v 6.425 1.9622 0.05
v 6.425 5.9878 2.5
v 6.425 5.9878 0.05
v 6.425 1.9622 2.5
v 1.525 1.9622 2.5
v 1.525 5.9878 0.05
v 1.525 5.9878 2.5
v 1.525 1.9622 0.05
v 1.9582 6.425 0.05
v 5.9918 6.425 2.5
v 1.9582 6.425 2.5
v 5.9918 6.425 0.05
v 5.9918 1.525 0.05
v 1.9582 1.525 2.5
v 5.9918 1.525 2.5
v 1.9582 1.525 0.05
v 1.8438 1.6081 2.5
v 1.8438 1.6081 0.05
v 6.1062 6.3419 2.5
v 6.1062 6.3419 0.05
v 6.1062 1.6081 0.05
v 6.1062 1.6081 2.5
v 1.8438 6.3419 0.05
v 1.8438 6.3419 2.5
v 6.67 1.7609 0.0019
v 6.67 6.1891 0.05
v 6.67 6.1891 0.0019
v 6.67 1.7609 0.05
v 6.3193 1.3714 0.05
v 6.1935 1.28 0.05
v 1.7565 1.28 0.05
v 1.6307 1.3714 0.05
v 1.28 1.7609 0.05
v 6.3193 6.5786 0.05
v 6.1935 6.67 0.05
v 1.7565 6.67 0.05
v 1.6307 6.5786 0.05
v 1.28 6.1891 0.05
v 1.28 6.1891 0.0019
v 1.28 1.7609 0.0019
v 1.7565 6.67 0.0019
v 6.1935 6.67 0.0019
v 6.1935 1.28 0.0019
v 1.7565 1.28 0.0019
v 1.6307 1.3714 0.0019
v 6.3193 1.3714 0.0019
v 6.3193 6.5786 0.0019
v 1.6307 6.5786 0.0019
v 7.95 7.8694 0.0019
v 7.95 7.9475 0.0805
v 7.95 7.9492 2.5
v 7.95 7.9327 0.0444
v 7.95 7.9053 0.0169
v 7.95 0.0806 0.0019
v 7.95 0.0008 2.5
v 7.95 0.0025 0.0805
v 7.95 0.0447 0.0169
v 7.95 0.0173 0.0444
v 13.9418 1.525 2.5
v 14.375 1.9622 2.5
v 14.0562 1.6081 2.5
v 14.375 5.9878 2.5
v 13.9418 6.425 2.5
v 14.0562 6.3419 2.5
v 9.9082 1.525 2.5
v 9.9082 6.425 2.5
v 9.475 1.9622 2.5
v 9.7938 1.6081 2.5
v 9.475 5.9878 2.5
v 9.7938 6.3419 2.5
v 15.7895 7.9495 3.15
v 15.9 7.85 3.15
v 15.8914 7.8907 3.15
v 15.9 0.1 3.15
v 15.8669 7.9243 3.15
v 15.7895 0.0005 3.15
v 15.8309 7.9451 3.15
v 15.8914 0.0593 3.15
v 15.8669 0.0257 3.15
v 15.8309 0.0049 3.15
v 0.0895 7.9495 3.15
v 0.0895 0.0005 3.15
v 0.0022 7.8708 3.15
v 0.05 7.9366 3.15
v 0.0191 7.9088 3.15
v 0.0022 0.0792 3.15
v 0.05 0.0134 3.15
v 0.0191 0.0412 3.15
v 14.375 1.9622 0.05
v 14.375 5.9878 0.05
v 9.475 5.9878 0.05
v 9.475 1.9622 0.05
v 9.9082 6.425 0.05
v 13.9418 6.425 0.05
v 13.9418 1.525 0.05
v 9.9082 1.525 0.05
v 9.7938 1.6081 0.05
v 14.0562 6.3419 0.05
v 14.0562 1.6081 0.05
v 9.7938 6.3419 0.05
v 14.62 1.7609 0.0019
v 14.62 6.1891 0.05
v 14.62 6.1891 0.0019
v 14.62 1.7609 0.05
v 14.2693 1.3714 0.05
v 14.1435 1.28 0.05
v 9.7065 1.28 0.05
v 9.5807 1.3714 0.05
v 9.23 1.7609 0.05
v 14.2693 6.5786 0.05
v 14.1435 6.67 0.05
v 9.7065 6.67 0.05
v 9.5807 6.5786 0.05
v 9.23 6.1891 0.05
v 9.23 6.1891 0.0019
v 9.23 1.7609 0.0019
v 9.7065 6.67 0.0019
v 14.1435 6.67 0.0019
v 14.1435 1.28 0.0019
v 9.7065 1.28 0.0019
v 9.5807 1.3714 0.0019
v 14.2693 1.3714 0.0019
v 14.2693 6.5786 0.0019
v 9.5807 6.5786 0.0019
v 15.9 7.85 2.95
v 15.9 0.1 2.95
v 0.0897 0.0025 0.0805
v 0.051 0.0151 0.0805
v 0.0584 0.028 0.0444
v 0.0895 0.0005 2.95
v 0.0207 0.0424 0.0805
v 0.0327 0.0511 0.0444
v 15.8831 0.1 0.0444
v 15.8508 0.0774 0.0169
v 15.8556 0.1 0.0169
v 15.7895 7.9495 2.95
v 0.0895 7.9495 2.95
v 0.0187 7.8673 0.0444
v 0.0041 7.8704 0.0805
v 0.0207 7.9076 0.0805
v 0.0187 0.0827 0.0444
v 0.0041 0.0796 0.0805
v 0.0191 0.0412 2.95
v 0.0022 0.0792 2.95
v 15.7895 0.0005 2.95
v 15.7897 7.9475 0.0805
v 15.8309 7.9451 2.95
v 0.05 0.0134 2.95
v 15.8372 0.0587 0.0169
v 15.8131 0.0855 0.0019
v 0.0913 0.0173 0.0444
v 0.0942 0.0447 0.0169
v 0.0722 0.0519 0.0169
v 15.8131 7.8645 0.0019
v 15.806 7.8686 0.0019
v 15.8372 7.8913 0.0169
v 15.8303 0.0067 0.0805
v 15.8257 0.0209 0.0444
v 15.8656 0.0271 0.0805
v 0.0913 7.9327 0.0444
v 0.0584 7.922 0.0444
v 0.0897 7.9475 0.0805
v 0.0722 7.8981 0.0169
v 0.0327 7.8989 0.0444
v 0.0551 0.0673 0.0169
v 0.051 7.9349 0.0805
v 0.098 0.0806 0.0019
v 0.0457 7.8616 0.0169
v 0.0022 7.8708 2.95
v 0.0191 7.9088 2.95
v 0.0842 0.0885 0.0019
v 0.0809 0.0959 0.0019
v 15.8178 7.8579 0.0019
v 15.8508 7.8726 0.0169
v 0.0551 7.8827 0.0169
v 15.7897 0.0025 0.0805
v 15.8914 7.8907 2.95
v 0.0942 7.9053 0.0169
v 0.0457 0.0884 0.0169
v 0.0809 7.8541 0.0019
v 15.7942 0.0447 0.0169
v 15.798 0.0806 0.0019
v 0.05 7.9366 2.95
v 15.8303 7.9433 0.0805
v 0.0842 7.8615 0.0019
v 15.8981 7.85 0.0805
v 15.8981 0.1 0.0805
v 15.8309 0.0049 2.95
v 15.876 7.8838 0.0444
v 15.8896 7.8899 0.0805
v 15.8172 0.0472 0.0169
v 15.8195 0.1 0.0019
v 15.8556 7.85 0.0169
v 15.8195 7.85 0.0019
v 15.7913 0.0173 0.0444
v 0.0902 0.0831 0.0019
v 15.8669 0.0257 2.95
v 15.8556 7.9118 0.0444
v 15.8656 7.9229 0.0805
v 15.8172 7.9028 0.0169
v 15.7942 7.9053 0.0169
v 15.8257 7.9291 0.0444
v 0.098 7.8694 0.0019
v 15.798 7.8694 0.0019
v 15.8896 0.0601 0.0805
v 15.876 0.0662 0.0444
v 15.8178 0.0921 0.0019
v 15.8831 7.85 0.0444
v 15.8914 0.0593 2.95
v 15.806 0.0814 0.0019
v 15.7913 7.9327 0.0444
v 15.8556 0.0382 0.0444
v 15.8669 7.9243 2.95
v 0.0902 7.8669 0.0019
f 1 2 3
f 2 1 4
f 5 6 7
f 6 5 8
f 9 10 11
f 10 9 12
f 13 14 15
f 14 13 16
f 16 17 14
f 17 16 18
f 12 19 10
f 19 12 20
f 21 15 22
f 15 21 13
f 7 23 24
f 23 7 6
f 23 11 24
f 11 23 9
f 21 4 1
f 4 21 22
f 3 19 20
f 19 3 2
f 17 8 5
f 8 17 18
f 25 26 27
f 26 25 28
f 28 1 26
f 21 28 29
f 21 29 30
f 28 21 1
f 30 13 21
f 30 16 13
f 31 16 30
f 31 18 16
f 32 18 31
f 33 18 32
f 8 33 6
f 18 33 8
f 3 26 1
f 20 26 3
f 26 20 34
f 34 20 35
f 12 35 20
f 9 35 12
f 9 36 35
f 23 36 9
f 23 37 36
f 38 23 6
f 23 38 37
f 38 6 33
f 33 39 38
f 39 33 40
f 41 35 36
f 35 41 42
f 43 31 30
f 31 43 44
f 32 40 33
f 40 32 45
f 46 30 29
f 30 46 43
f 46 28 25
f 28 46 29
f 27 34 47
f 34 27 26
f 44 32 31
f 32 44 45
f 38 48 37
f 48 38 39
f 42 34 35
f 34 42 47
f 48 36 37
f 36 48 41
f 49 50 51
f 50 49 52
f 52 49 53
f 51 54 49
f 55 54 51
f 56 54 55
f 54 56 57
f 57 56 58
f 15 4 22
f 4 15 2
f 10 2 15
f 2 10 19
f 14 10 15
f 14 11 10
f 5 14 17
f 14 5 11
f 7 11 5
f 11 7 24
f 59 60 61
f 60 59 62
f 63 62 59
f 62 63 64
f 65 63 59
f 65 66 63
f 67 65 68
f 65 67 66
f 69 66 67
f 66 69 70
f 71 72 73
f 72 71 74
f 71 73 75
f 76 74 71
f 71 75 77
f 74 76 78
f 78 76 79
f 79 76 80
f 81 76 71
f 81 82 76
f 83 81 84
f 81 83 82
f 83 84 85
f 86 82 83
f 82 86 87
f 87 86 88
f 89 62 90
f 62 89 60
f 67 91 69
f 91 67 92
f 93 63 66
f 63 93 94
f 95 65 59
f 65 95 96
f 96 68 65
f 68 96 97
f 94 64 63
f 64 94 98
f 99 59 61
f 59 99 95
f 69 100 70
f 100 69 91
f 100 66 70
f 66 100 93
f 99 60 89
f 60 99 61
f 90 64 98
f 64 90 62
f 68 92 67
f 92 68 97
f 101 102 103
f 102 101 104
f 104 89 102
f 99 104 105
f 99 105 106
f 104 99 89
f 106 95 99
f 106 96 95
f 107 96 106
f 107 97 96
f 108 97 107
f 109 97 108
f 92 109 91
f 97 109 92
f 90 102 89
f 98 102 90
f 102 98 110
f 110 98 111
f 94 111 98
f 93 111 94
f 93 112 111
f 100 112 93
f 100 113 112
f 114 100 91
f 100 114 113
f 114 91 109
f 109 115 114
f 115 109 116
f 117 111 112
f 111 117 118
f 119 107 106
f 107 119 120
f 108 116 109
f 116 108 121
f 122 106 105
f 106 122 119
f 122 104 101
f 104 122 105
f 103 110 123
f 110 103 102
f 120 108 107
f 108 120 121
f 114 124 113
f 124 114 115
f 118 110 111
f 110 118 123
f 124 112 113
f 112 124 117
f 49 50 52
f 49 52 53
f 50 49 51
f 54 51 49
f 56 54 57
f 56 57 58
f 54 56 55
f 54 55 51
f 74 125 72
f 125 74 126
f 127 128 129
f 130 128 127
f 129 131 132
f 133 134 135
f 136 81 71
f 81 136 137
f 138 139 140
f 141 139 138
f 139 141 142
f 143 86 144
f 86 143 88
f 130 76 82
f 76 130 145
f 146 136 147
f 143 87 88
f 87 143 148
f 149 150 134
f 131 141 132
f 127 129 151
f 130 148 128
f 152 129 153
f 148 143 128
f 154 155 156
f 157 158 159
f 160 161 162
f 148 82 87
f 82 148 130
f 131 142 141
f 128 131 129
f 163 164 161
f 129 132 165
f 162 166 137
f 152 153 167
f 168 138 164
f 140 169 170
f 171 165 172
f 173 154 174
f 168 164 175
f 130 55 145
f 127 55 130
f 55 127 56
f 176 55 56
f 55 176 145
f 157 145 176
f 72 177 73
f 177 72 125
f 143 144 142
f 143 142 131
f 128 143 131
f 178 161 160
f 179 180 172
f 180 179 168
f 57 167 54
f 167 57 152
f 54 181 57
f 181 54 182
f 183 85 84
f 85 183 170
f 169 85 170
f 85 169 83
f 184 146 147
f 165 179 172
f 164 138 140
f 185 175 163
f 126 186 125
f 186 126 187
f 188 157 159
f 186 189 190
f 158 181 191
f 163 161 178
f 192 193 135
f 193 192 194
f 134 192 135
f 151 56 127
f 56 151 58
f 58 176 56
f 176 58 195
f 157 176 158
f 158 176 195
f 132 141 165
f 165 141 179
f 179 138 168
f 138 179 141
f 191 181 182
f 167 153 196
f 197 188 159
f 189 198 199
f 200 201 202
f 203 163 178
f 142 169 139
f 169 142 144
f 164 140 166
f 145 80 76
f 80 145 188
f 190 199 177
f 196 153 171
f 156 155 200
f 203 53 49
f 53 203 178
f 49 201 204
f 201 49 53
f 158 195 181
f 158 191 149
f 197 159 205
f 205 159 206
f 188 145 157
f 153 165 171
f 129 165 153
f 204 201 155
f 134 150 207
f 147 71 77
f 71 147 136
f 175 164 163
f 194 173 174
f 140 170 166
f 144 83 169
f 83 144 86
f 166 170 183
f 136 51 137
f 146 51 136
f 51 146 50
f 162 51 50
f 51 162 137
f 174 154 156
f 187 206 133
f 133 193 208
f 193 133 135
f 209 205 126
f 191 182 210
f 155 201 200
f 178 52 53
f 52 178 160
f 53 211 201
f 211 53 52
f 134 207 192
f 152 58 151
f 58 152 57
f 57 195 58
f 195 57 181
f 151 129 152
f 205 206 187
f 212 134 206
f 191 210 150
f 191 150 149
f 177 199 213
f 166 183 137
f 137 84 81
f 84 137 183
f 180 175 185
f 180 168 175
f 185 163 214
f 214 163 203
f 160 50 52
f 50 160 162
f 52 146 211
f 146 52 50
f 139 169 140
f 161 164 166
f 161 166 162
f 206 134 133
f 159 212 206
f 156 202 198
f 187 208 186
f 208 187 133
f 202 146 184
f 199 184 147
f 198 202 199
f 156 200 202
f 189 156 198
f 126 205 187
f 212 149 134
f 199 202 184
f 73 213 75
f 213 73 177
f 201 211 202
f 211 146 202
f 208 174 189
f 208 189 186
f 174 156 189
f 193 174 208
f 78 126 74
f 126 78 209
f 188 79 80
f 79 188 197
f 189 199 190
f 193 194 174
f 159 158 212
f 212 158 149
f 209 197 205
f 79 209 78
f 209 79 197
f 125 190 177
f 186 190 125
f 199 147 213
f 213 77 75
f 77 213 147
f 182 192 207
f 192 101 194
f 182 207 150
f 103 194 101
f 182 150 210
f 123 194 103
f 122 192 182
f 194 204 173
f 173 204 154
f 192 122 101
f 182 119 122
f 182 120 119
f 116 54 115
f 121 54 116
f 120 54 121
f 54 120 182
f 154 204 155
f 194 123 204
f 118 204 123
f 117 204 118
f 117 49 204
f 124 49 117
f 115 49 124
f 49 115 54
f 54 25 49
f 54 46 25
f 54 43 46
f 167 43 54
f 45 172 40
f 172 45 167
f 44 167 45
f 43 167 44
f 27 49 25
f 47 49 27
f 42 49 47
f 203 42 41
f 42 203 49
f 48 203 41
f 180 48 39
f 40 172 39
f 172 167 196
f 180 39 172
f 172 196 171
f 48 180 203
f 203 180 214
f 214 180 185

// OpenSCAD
// file: ../lib/roundedcube_simple.scad
module roundedcube_simple(size = [1, 1, 1], center = false, radius = 0.5, resolution = 20) {
	// If single value, convert to [x, y, z] vector
	size = (size[0] == undef) ? [size, size, size] : size;

	translate = (center == false) ?
		[radius, radius, radius] :
		[
			radius - (size[0] / 2),
			radius - (size[1] / 2),
			radius - (size[2] / 2)
	];

	translate(v = translate)
	minkowski() {
		cube(size = [
			size[0] - (radius * 2),
			size[1] - (radius * 2),
			size[2] - (radius * 2)
		]);
		sphere(r = radius, $fn = resolution);
	}
}
// file: ../lib/roundedcube.scad
// More information: https://danielupshaw.com/openscad-rounded-corners/

// Set to 0.01 for higher definition curves (renders slower)
$fs = 0.15;

module roundedcube(size = [1, 1, 1], center = false, radius = 0.5, apply_to = "all", resolution = 20) {
	// If single value, convert to [x, y, z] vector
	size = (size[0] == undef) ? [size, size, size] : size;

	translate_min = radius;
	translate_xmax = size[0] - radius;
	translate_ymax = size[1] - radius;
	translate_zmax = size[2] - radius;

	diameter = radius * 2;

	obj_translate = (center == false) ?
		[0, 0, 0] : [
			-(size[0] / 2),
			-(size[1] / 2),
			-(size[2] / 2)
		];

	translate(v = obj_translate) {
		hull() {
			for (translate_x = [translate_min, translate_xmax]) {
				x_at = (translate_x == translate_min) ? "min" : "max";
				for (translate_y = [translate_min, translate_ymax]) {
					y_at = (translate_y == translate_min) ? "min" : "max";
					for (translate_z = [translate_min, translate_zmax]) {
						z_at = (translate_z == translate_min) ? "min" : "max";

						translate(v = [translate_x, translate_y, translate_z])
						if (
							(apply_to == "all") ||
							(apply_to == "xmin" && x_at == "min") || (apply_to == "xmax" && x_at == "max") ||
							(apply_to == "ymin" && y_at == "min") || (apply_to == "ymax" && y_at == "max") ||
							(apply_to == "zmin" && z_at == "min") || (apply_to == "zmax" && z_at == "max")
						) {
							sphere(r = radius, $fn = resolution);
						} else {
							rotate = 
								(apply_to == "xmin" || apply_to == "xmax" || apply_to == "x") ? [0, 90, 0] : (
								(apply_to == "ymin" || apply_to == "ymax" || apply_to == "y") ? [90, 90, 0] :
								[0, 0, 0]
							);
							rotate(a = rotate)
							cylinder(h = diameter, r = radius, center = true, $fn = resolution);
						}
					}
				}
			}
		}
	}
}
// main file
echo(version=version());

include <../lib/block.scad>;

block(grid=[2,1], withKnobs=false);
